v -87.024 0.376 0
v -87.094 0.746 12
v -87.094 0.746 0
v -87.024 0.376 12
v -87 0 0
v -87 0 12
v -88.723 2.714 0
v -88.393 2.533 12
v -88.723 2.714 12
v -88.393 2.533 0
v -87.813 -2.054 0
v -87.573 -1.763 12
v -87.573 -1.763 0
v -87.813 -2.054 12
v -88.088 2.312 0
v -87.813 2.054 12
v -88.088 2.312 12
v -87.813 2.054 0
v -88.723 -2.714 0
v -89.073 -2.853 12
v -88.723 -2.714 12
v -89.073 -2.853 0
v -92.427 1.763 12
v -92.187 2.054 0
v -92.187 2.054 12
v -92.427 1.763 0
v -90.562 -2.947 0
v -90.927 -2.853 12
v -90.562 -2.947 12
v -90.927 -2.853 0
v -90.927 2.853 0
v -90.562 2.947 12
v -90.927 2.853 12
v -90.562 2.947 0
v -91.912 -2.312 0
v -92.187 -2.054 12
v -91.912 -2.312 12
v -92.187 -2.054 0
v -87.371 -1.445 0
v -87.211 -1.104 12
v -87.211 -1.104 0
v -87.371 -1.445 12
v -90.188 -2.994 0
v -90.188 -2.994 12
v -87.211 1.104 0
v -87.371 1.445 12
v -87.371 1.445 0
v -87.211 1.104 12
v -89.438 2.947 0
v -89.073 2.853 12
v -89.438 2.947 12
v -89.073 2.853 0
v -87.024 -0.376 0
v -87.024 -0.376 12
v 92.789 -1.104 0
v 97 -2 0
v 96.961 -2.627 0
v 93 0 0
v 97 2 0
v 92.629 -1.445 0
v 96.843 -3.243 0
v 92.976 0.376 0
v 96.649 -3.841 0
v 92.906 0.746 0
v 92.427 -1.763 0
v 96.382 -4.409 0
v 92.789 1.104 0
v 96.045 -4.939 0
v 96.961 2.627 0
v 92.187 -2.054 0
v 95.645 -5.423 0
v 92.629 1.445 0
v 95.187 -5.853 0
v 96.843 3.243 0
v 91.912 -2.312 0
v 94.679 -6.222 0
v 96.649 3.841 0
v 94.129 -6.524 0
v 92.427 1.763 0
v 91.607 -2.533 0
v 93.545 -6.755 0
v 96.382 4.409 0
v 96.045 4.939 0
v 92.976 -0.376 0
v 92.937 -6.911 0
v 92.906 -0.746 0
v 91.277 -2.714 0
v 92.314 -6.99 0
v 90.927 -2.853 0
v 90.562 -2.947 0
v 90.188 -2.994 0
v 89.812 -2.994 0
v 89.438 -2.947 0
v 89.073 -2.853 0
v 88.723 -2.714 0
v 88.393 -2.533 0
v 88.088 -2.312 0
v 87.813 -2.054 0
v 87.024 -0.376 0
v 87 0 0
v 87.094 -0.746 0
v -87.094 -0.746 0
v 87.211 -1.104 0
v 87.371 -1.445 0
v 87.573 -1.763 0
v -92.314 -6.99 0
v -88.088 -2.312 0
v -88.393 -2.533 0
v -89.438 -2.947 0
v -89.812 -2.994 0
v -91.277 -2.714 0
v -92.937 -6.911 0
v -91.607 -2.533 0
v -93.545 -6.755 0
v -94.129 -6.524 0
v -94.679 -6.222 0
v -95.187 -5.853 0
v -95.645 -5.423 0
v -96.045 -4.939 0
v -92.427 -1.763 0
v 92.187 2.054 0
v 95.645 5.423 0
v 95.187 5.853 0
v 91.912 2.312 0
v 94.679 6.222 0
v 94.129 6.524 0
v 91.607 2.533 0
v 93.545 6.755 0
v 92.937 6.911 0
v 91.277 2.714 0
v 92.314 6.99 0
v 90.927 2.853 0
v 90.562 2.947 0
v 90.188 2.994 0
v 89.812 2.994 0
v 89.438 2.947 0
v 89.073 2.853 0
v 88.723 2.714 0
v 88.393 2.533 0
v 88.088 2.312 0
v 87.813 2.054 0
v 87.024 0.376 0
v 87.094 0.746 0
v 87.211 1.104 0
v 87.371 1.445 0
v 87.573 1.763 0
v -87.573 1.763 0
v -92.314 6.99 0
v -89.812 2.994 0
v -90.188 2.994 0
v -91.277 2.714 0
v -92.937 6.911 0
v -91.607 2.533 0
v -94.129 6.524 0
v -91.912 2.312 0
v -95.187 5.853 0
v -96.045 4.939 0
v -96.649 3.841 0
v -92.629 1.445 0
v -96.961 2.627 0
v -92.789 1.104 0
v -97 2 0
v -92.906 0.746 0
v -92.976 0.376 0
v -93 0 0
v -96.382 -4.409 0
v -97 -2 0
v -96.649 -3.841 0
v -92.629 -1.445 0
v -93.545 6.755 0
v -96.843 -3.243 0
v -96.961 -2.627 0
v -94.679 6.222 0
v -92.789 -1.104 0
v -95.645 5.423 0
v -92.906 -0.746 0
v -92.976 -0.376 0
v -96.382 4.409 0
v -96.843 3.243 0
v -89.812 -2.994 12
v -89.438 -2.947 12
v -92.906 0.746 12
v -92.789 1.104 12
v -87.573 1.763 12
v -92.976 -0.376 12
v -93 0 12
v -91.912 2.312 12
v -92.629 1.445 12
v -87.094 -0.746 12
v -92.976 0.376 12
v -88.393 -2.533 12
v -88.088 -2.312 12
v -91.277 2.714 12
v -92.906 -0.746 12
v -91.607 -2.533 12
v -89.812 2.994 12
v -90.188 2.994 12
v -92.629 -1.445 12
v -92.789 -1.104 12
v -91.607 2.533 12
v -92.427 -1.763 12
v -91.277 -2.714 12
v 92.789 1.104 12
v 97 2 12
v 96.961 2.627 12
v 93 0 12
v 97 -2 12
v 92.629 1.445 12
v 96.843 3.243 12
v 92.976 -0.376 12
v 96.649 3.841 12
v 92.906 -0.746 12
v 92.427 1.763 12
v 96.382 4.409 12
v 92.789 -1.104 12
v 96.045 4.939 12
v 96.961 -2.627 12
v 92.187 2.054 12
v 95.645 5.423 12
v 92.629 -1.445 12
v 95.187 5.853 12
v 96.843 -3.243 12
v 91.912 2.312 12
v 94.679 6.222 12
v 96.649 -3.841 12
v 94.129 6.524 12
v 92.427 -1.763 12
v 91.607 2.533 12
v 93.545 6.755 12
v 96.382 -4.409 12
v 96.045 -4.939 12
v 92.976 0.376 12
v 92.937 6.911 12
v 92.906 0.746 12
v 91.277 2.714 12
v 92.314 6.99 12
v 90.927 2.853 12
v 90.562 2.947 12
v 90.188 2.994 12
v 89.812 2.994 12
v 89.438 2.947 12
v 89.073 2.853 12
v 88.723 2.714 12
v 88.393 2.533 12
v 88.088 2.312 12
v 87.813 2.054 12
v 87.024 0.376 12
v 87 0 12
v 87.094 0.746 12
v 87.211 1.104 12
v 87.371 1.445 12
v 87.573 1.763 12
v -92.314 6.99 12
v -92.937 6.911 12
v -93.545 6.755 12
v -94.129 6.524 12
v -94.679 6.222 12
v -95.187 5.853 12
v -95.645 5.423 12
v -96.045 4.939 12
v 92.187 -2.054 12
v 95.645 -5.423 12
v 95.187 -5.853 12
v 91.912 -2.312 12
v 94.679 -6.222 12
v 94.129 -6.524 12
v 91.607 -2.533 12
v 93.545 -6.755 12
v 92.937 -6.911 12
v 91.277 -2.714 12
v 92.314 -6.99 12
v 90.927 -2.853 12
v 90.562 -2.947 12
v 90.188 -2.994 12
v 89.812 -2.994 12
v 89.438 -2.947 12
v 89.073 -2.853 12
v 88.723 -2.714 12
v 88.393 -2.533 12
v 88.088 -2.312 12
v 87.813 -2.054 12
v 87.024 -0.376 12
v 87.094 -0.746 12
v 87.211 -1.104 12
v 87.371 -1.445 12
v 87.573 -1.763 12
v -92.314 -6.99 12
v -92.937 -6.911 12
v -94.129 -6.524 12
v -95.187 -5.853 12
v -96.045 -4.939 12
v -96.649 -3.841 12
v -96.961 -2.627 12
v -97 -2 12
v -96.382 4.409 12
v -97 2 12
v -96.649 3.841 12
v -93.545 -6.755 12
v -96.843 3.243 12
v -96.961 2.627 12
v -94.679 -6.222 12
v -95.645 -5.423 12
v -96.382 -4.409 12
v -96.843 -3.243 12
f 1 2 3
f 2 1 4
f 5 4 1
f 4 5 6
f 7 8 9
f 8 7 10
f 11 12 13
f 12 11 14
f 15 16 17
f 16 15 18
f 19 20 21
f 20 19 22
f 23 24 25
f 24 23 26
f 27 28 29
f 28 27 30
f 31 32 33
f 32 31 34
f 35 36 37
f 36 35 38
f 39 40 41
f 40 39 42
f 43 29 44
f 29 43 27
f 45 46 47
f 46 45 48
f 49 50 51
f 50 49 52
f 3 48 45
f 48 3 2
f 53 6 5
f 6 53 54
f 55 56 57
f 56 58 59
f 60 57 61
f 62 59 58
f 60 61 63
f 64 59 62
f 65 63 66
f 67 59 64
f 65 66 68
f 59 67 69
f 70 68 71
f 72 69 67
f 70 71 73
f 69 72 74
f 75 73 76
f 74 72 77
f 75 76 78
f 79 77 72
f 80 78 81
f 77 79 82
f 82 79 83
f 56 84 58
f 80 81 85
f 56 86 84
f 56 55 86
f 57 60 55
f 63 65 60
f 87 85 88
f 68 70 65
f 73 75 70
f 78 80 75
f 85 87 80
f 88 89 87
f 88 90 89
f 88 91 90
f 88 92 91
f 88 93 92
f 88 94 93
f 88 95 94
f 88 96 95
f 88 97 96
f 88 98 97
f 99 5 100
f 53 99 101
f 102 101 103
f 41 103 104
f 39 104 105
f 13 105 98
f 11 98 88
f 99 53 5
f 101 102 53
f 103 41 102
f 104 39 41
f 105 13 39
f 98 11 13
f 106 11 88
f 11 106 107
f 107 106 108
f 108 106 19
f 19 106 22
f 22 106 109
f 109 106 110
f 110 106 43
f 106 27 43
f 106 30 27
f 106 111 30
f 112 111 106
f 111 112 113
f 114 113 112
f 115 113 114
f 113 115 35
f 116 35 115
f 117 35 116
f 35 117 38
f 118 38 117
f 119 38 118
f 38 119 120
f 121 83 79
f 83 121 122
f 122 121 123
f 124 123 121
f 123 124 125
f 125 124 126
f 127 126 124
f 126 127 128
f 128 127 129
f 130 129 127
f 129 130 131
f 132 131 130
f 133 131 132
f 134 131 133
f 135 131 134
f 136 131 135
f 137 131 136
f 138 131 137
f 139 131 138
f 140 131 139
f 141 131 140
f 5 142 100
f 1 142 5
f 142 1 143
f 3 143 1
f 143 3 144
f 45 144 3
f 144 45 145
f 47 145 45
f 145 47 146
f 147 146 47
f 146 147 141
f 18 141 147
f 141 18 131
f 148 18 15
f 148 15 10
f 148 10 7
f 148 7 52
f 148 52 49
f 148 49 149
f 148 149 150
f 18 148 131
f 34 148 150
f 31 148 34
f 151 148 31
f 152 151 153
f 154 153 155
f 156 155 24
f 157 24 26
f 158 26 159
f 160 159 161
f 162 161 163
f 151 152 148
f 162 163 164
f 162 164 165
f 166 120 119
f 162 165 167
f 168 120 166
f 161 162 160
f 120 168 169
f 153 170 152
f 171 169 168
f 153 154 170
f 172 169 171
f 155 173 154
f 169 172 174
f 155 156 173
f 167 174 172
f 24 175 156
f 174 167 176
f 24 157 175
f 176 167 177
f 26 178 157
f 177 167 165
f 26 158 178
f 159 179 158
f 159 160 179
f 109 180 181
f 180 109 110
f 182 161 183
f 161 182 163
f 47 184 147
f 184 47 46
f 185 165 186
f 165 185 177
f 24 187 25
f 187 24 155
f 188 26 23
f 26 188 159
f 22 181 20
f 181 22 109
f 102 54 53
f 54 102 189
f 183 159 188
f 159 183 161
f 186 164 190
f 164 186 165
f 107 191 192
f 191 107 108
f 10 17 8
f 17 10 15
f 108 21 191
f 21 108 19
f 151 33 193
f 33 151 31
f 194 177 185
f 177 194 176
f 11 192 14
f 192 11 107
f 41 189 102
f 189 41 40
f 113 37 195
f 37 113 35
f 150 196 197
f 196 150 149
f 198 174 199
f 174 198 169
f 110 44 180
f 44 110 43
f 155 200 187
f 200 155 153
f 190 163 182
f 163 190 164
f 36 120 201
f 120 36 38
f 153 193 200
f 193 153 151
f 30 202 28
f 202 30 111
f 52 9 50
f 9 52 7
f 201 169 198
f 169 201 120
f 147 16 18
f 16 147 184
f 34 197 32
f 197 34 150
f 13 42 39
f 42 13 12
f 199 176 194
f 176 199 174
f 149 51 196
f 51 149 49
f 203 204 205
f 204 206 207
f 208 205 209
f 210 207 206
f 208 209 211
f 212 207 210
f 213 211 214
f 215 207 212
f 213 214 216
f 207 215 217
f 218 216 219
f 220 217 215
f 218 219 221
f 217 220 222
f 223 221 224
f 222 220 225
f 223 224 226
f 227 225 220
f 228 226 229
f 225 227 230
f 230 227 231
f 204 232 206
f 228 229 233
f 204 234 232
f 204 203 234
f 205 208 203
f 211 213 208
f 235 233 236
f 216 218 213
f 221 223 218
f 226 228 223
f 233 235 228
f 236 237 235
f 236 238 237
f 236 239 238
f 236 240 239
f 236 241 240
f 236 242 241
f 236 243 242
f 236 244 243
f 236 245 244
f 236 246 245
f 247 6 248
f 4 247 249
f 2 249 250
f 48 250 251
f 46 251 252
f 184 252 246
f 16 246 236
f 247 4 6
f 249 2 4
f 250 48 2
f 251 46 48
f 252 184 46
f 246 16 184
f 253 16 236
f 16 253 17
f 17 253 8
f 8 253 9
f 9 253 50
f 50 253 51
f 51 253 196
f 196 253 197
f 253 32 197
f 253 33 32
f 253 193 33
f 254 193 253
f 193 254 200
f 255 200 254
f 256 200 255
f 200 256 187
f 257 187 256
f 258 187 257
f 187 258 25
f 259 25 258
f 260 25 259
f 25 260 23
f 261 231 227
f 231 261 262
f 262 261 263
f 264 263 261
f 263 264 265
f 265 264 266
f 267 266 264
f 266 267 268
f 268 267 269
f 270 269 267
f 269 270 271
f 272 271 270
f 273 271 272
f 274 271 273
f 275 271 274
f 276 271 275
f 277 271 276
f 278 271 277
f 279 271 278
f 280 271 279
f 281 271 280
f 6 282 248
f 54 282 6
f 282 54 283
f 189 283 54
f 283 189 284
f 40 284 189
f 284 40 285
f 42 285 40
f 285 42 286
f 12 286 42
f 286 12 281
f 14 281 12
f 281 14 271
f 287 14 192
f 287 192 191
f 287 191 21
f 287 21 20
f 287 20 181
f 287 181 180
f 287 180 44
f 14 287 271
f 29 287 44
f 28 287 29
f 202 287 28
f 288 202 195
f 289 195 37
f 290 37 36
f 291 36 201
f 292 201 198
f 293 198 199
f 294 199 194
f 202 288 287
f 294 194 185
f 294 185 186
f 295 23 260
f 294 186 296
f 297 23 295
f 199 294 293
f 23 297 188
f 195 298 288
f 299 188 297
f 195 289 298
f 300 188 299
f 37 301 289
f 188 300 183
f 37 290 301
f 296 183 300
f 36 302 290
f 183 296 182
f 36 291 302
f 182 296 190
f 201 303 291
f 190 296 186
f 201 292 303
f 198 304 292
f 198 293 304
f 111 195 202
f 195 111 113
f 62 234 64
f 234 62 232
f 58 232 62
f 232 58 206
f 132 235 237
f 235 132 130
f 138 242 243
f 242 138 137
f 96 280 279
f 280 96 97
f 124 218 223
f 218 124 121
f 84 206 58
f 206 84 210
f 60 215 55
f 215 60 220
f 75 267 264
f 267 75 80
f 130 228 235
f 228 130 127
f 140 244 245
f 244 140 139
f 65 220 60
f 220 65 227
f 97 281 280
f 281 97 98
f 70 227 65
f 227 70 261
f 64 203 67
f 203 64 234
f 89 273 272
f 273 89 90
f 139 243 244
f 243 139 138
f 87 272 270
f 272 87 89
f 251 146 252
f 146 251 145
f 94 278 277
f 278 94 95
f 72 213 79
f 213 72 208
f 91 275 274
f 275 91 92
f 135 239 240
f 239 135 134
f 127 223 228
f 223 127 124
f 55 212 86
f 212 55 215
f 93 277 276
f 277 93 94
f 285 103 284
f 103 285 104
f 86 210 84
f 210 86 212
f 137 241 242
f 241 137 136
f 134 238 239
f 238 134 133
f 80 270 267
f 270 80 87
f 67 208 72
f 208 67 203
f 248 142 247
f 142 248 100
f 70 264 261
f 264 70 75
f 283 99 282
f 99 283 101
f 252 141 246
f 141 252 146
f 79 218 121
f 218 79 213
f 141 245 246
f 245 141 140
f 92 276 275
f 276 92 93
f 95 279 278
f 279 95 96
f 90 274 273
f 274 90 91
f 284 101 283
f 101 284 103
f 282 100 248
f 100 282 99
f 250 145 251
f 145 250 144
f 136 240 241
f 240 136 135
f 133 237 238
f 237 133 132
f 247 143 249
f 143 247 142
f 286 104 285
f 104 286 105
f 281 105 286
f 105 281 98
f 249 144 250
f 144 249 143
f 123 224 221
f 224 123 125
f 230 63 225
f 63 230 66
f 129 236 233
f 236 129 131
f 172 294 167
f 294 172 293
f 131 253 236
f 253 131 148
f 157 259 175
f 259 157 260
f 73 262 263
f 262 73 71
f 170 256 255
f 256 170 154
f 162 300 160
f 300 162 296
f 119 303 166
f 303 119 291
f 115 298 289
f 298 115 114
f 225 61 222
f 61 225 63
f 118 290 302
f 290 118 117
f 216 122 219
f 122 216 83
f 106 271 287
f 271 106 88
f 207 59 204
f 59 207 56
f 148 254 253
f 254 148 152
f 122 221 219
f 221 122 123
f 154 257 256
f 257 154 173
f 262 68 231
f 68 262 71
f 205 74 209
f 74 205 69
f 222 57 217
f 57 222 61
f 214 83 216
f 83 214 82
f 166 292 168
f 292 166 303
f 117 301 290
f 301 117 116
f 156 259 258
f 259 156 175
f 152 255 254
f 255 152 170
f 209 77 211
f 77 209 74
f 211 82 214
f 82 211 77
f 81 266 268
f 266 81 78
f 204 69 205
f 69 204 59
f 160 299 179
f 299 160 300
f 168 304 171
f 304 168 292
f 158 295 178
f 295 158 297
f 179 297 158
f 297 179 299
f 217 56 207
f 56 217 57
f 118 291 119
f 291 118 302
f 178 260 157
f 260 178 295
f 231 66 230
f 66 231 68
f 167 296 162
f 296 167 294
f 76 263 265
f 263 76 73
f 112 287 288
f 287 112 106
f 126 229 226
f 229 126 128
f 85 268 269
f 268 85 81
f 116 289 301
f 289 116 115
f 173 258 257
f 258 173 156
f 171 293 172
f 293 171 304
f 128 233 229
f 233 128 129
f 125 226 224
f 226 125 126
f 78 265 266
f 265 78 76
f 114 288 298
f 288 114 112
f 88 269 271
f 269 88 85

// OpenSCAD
$fn = 50;


difference() {
	union() {
		hull() {
			translate(v = [-92.0000000000, 2.0000000000, 0]) {
				cylinder(h = 12, r = 5);
			}
			translate(v = [92.0000000000, 2.0000000000, 0]) {
				cylinder(h = 12, r = 5);
			}
			translate(v = [-92.0000000000, -2.0000000000, 0]) {
				cylinder(h = 12, r = 5);
			}
			translate(v = [92.0000000000, -2.0000000000, 0]) {
				cylinder(h = 12, r = 5);
			}
		}
	}
	union() {
		translate(v = [-90.0000000000, 0.0000000000, 0]) {
			cylinder(h = 12, r = 3.0000000000);
		}
		translate(v = [90.0000000000, 0.0000000000, 0]) {
			cylinder(h = 12, r = 3.0000000000);
		}
		translate(v = [-90.0000000000, 0.0000000000, 0]) {
			cylinder(h = 12, r = 1.5000000000);
		}
		translate(v = [90.0000000000, 0.0000000000, 0]) {
			cylinder(h = 12, r = 1.5000000000);
		}
		translate(v = [-90.0000000000, 0.0000000000, 0]) {
			cylinder(h = 12, r = 1.5000000000);
		}
		translate(v = [90.0000000000, 0.0000000000, 0]) {
			cylinder(h = 12, r = 1.5000000000);
		}
		translate(v = [-90.0000000000, 0.0000000000, 0]) {
			cylinder(h = 12, r = 1.5000000000);
		}
		translate(v = [90.0000000000, 0.0000000000, 0]) {
			cylinder(h = 12, r = 1.5000000000);
		}
	}
}
